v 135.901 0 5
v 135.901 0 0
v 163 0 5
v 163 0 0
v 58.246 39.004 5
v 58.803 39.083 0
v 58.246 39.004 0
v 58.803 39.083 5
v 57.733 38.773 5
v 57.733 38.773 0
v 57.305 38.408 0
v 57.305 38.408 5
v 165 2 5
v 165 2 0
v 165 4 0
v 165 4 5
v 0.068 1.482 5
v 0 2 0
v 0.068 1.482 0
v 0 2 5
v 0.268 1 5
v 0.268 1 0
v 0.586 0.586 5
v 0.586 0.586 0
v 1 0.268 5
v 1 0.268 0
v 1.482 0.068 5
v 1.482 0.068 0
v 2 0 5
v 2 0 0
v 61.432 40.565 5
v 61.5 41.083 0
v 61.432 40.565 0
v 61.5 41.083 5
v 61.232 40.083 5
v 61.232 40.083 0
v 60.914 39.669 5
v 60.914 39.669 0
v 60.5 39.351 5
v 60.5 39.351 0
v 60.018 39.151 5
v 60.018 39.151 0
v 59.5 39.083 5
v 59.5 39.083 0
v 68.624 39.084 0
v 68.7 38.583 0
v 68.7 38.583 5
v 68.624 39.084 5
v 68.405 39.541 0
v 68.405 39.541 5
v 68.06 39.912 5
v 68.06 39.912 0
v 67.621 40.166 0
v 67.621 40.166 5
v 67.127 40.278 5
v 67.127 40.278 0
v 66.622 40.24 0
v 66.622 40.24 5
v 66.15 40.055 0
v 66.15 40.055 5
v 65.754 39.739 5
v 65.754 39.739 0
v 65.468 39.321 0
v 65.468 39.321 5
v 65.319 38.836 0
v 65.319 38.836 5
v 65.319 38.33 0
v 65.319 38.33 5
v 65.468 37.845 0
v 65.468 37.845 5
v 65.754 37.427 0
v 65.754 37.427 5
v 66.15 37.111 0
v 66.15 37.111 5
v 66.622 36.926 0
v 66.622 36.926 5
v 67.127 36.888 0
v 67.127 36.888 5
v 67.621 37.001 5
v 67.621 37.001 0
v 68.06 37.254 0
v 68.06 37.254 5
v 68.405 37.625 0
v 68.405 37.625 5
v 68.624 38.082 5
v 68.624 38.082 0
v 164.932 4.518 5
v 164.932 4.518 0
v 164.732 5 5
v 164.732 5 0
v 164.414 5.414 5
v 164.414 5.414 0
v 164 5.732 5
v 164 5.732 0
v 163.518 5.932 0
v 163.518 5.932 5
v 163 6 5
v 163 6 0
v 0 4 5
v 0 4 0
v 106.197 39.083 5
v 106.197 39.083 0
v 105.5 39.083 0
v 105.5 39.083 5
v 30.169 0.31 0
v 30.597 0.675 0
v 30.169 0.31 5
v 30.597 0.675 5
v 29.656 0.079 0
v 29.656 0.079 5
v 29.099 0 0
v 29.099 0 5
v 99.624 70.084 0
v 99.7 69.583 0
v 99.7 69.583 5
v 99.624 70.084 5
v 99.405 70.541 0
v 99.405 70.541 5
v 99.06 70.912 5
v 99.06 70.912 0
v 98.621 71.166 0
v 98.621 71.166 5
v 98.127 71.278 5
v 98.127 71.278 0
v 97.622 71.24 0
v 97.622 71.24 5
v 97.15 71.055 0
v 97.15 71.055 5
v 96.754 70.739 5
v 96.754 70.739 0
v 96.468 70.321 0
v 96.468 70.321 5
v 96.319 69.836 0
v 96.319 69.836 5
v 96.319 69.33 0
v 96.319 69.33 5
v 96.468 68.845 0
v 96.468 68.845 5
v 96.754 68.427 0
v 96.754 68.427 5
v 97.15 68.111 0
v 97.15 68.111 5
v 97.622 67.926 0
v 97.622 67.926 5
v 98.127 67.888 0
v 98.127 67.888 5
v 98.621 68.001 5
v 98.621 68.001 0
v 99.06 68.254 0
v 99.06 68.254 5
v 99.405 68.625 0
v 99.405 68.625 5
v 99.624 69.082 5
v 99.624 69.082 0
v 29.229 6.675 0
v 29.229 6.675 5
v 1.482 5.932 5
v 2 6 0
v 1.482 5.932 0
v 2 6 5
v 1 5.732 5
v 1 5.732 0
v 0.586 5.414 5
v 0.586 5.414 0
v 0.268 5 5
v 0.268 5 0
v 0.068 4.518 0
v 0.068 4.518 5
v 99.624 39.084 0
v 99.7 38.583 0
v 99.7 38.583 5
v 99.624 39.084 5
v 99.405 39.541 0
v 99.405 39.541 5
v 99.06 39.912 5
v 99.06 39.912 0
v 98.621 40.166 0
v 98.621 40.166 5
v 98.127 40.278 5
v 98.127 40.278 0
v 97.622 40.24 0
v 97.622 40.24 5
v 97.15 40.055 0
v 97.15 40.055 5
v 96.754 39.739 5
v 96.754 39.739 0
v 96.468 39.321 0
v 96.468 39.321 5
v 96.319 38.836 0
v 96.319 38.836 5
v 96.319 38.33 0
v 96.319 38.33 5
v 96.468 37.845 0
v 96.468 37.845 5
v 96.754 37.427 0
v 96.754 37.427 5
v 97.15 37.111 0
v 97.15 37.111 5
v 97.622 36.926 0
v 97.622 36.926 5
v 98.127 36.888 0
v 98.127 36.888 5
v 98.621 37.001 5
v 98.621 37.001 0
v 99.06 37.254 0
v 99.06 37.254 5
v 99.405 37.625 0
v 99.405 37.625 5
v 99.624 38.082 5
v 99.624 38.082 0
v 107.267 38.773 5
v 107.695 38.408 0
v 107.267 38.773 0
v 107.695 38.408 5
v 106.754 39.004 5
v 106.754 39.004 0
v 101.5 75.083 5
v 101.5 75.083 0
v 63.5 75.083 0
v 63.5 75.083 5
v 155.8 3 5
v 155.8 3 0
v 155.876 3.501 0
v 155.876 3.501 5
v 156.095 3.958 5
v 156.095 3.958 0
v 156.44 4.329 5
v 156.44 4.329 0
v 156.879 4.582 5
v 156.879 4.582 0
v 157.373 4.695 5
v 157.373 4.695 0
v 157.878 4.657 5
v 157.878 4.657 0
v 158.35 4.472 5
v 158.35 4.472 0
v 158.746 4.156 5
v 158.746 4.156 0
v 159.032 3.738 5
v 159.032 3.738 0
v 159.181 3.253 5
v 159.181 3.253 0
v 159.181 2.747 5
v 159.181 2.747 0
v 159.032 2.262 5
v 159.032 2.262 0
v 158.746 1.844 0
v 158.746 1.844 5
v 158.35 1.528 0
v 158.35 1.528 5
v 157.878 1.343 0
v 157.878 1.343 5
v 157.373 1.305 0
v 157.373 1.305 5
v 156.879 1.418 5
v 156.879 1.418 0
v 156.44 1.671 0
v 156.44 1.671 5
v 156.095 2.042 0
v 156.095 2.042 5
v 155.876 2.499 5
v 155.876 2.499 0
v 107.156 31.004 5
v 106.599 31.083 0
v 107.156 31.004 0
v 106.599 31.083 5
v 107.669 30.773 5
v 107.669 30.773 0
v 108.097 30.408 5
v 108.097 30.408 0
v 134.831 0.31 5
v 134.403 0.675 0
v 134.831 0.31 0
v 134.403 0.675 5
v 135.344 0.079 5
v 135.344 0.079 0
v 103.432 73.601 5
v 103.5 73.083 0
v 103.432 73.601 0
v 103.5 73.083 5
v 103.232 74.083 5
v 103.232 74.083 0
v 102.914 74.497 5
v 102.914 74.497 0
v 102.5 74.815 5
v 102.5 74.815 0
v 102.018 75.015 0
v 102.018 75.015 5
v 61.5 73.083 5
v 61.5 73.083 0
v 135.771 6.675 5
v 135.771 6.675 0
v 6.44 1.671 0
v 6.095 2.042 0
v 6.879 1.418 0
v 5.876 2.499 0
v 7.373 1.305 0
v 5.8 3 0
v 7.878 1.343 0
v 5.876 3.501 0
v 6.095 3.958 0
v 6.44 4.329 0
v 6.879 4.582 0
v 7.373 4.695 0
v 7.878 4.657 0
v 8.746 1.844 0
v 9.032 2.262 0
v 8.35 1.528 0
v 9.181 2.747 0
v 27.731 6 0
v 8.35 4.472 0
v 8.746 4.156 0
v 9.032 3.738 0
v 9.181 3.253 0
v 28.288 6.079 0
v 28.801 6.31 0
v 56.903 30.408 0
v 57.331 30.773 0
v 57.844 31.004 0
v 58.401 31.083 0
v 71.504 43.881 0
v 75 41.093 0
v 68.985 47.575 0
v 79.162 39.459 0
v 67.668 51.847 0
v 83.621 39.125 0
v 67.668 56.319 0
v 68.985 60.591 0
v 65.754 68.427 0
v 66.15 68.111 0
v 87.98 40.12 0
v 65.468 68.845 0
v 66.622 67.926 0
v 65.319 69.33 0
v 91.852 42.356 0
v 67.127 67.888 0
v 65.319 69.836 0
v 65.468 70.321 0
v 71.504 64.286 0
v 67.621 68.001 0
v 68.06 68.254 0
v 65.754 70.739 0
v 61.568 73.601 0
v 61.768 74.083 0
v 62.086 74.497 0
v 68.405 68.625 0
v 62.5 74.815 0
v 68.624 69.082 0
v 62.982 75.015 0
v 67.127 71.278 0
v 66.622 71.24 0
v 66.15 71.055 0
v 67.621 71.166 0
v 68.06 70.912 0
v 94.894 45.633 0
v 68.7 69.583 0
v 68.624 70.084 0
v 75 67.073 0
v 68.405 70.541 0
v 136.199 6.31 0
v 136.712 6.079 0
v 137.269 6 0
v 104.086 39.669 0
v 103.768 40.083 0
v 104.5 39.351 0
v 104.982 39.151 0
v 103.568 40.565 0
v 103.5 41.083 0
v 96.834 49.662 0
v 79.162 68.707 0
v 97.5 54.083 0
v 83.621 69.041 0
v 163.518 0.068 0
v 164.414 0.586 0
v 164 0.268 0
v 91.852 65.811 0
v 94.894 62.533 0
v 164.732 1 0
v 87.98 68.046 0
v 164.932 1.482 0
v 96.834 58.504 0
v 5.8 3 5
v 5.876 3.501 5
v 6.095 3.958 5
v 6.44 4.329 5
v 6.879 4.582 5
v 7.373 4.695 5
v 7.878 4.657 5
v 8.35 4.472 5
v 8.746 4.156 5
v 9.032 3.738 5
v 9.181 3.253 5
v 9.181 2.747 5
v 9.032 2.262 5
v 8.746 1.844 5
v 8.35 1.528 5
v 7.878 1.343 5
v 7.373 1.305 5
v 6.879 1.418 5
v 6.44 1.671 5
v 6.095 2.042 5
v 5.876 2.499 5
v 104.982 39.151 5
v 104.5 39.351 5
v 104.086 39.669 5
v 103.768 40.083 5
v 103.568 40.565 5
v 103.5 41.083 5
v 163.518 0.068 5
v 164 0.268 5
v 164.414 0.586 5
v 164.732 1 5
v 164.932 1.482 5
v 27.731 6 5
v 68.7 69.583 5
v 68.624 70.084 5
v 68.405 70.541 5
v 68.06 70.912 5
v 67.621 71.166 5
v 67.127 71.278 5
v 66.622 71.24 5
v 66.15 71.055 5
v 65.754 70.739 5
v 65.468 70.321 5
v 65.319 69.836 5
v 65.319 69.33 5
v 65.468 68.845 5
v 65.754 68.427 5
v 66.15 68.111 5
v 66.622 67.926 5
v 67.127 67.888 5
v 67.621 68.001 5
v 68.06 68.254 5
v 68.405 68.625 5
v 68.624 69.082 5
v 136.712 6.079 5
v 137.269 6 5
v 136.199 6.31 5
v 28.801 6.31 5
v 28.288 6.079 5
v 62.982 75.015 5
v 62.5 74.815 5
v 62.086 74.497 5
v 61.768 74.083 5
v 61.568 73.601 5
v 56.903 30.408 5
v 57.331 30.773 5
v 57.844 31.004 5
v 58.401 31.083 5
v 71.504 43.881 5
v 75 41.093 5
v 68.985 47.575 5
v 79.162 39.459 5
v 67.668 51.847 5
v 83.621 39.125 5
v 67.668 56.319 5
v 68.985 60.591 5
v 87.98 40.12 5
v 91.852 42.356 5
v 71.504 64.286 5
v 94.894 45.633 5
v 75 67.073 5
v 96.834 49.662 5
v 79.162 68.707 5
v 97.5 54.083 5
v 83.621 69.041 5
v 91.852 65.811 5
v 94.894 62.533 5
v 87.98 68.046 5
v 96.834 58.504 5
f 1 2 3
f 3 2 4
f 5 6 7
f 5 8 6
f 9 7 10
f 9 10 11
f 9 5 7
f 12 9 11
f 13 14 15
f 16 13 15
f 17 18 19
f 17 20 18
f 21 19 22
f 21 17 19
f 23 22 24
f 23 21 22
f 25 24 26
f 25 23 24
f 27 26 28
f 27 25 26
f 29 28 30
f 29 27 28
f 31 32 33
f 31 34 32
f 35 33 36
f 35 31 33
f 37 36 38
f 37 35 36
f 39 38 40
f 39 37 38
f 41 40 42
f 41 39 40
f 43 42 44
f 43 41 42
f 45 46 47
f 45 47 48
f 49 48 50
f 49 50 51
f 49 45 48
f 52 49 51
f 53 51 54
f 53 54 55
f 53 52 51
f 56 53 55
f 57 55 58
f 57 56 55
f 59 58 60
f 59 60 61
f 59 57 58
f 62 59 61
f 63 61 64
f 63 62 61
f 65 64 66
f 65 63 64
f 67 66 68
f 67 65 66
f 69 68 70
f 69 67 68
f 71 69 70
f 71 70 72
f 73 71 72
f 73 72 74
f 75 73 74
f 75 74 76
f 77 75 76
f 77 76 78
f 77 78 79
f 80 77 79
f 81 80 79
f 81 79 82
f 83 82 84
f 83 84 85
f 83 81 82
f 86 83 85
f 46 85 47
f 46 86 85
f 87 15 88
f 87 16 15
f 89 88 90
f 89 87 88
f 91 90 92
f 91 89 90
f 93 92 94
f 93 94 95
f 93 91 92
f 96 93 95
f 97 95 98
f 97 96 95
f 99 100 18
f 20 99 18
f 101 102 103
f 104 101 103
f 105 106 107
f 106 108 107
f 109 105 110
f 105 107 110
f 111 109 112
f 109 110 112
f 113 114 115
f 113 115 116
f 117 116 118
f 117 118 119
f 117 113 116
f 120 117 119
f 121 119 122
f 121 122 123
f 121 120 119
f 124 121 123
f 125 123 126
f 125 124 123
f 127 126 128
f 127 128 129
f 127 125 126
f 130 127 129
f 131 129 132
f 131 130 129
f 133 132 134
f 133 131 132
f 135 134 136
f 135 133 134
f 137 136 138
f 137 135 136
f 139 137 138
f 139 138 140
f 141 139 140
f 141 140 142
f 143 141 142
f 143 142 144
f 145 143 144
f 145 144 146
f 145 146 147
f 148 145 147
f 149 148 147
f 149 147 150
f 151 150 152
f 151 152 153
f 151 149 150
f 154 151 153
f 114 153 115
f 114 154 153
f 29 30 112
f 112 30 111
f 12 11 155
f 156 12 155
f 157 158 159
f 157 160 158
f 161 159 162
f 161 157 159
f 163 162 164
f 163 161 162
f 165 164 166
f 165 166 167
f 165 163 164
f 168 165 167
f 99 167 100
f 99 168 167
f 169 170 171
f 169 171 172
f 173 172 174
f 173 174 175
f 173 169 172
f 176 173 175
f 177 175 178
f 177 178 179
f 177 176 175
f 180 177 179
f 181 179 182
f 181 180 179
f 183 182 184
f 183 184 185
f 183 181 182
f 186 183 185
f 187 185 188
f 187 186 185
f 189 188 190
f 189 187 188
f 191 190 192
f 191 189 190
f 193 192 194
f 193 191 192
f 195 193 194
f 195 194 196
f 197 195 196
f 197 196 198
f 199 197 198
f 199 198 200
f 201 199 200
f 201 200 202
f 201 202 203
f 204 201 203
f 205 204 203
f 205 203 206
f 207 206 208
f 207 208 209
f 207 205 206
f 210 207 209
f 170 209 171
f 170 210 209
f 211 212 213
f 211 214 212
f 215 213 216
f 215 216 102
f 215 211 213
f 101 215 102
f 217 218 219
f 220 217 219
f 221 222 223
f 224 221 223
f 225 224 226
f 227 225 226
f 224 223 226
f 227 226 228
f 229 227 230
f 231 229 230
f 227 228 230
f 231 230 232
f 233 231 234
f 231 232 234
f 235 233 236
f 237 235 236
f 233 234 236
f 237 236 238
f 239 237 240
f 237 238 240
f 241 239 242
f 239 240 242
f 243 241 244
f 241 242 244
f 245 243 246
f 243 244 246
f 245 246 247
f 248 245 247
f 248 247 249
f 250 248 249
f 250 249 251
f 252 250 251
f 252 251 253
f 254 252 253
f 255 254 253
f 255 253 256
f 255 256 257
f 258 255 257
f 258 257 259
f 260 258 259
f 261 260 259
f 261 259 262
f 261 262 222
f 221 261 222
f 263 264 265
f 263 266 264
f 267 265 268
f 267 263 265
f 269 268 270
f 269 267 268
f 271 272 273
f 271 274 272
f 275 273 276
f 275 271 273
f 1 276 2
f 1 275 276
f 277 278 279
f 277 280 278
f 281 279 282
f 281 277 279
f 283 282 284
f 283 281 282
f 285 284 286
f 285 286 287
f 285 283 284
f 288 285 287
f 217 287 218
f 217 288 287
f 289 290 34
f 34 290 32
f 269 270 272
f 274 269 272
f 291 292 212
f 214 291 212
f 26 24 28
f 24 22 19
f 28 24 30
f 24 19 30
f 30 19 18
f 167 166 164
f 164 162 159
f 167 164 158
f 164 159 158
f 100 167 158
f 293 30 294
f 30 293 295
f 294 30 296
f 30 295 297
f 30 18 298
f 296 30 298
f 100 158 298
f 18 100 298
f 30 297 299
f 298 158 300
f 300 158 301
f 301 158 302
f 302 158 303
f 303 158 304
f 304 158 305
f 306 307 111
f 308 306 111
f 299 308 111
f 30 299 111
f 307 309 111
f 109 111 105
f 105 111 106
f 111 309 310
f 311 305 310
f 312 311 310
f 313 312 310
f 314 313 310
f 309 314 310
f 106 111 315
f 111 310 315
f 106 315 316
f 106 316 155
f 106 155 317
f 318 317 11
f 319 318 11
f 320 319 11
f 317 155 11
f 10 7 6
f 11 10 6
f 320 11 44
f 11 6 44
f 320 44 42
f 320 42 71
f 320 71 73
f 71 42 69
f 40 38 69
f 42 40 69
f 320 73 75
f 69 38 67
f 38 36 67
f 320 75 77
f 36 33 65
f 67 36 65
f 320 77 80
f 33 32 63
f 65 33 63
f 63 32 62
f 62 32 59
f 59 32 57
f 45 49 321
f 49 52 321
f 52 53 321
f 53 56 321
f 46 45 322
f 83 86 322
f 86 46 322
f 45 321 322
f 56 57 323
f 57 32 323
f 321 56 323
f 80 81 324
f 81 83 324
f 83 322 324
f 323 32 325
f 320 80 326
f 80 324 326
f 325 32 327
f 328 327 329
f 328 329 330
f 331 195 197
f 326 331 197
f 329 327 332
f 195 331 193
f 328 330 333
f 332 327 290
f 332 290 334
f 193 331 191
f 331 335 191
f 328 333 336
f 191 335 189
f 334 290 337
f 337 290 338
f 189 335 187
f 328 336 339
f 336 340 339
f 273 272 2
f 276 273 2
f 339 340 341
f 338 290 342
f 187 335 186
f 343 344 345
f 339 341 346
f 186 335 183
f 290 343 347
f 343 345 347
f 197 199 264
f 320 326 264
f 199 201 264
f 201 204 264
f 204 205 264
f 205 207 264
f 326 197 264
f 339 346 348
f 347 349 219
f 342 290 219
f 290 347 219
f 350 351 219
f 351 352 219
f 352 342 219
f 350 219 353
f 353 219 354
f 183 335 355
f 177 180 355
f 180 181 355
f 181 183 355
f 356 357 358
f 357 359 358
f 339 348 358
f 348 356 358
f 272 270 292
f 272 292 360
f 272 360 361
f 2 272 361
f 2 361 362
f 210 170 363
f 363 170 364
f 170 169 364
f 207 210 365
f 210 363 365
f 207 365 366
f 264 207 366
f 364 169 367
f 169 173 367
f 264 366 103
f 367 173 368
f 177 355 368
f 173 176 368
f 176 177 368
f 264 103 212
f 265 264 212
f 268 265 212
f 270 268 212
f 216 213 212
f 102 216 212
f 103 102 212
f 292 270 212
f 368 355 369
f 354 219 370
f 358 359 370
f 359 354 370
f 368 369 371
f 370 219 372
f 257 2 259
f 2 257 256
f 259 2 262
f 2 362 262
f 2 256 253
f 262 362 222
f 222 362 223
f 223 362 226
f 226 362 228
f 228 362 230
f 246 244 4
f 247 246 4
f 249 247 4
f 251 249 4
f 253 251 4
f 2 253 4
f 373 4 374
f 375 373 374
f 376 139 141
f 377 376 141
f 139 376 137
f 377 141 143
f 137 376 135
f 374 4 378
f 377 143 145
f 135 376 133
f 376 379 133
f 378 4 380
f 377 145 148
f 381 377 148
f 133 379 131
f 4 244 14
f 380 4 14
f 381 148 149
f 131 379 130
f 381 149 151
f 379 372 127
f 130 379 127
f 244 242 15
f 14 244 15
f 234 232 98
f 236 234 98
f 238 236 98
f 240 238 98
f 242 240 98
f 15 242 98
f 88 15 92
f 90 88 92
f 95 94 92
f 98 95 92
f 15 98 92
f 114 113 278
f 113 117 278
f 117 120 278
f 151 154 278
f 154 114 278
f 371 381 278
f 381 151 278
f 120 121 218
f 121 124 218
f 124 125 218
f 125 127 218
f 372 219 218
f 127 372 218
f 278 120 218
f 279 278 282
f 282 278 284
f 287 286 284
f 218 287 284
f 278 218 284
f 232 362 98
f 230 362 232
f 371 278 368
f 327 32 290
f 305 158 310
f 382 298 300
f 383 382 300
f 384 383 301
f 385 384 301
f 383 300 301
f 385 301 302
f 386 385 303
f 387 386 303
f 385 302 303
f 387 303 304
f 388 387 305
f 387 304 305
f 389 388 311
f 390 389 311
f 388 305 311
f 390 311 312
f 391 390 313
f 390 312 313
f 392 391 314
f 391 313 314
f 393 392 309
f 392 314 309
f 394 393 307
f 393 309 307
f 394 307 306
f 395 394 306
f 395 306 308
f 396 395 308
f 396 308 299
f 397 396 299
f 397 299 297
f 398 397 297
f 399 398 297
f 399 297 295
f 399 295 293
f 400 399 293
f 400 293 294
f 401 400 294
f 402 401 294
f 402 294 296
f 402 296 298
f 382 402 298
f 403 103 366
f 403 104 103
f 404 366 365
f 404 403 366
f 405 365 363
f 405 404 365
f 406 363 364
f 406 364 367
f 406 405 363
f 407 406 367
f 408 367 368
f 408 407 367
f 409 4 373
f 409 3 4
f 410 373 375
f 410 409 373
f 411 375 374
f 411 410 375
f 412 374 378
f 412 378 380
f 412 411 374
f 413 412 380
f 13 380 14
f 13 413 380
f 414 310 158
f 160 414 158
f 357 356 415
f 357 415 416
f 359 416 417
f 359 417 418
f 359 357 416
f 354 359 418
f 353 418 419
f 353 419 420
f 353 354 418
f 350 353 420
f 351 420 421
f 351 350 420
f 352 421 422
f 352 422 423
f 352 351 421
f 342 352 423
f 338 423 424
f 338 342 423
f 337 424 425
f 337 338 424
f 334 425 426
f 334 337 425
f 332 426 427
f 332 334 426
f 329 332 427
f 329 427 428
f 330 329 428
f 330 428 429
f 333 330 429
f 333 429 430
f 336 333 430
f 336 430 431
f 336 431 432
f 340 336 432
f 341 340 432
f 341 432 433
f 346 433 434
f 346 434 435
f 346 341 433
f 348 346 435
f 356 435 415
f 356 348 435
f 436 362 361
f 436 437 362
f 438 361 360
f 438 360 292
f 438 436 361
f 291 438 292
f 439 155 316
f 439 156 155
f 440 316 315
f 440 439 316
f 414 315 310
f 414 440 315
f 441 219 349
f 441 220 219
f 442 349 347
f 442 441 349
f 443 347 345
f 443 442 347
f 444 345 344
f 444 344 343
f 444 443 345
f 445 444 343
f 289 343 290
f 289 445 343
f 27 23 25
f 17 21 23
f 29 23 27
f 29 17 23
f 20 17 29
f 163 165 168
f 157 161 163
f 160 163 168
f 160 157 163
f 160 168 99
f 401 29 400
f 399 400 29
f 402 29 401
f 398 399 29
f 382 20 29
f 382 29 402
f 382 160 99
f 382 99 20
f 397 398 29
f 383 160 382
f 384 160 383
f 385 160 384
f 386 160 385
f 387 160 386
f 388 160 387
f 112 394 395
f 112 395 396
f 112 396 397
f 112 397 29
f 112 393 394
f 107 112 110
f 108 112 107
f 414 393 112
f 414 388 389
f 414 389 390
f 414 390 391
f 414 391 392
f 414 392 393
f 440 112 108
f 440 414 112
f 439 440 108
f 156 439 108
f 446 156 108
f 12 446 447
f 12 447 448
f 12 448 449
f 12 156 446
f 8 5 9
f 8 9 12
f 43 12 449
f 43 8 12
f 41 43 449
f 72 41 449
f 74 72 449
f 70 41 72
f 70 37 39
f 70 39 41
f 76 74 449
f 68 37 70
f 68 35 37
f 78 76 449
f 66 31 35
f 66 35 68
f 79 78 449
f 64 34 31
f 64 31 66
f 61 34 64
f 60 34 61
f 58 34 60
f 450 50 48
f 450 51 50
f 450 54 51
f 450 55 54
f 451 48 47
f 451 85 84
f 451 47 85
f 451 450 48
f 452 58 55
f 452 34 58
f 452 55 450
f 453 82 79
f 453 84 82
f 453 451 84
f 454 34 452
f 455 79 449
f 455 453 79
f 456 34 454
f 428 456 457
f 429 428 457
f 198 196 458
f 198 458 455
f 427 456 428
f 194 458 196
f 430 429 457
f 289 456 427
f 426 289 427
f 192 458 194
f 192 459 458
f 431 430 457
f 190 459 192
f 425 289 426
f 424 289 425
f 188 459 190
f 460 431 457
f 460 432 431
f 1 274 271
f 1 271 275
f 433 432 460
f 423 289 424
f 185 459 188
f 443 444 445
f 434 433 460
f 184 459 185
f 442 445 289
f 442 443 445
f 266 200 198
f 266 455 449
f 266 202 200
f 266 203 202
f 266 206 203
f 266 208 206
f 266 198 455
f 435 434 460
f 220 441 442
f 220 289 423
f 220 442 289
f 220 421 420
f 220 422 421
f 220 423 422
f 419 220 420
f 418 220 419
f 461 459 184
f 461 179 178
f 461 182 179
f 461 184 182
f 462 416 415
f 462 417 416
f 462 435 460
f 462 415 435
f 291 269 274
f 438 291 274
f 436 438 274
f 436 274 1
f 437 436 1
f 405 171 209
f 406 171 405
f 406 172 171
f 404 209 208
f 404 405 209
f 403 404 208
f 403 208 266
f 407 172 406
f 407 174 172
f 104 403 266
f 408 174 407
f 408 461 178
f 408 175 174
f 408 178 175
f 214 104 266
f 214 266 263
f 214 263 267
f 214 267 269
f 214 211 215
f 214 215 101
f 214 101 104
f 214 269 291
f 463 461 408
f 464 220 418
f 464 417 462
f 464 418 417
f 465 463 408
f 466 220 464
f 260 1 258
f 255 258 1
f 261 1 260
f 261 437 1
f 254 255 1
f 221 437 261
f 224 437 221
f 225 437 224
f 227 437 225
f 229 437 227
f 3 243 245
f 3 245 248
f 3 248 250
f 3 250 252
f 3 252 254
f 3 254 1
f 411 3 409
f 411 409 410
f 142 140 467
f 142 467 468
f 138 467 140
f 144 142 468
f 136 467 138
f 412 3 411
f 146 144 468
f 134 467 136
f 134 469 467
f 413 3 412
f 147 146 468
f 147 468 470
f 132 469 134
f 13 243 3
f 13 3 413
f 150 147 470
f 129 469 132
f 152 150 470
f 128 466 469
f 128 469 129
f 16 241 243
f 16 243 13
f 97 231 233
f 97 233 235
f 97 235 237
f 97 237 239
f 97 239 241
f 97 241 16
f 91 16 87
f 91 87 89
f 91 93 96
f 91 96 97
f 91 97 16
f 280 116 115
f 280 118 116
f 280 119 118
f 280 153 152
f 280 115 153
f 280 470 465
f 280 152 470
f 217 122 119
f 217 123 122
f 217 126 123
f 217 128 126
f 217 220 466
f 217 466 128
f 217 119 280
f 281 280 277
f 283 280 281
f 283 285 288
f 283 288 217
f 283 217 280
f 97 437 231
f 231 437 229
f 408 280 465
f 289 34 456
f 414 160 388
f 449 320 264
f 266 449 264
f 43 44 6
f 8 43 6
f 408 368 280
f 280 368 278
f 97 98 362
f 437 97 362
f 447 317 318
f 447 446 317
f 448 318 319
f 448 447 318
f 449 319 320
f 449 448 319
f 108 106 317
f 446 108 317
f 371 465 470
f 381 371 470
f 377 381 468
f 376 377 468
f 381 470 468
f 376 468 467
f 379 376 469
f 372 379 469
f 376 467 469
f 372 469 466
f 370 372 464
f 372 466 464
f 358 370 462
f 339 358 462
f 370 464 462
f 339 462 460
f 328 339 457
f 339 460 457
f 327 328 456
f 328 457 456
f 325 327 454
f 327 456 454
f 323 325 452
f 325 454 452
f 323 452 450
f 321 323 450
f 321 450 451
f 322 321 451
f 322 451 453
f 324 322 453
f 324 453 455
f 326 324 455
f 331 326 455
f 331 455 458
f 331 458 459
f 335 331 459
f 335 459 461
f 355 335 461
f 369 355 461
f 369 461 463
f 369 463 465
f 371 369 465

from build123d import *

# Parameters (mm, degrees)
EXTRUDE_1_DEPTH            = 5
FILLET_1_R                 = 2
HOLE_WIZARD_M3_1_OUTLINE_R = 1.7
HOLE_WIZARD_M3_1_DEPTH     = 5
SKETCH_4_R                 = 15
CUT_EXTRUDE_1_DEPTH        = 10
HOLE_WIZARD_M3_5_D         = 3.4


# Read off the part's stored shape, not the designer's step: M3 间隙孔1
with BuildPart() as part:
    # 草图1 → 凸台-拉伸1 (new body)
    with BuildSketch(Plane.XY):
        Polygon((30, 0), (57.5, 31.083095625), (107.5, 31.083095625), (135, 0), (165, 0), (165, 6), (136.367610504, 6), (107.098159975, 39.083095625), (103.5, 39.083095625), (103.5, 75.083095625), (61.5, 75.083095625), (61.5, 39.083095625), (57.901840025, 39.083095625), (28.632389496, 6), (0, 6), (0, 0), align=None)
    extrude(amount=EXTRUDE_1_DEPTH)

    # 圆角1
    fillet_1_edges = [part.edges().sort_by_distance(p)[0] for p in [
        (28.632389496, 6, 2.5),
        (0, 6, 2.5),
        (0, 0, 2.5),
        (30, 0, 2.5),
        (57.5, 31.083095625, 2.5),
        (107.5, 31.083095625, 2.5),
        (135, 0, 2.5),
        (165, 0, 2.5),
        (165, 6, 2.5),
        (136.367610504, 6, 2.5),
        (107.098159975, 39.083095625, 2.5),
        (103.5, 39.083095625, 2.5),
        (103.5, 75.083095625, 2.5),
        (61.5, 75.083095625, 2.5),
        (61.5, 39.083095625, 2.5),
        (57.901840025, 39.083095625, 2.5),
    ]]
    fillet(fillet_1_edges, radius=FILLET_1_R)

    # M3 间隙孔1 outline → M3 间隙孔1 (cut)
    with BuildSketch(Plane.XY):
        with Locations((98, 69.583095625)):
            Circle(HOLE_WIZARD_M3_1_OUTLINE_R)
        with Locations((67, 38.583095625)):
            Circle(HOLE_WIZARD_M3_1_OUTLINE_R)
        with Locations((98, 38.583095625)):
            Circle(HOLE_WIZARD_M3_1_OUTLINE_R)
        with Locations((67, 69.583095625)):
            Circle(HOLE_WIZARD_M3_1_OUTLINE_R)
    extrude(amount=HOLE_WIZARD_M3_1_DEPTH, mode=Mode.SUBTRACT)

    # 草图4 → 切除-拉伸1 (cut)
    with BuildSketch(Plane.XY.offset(5)):
        with Locations((82.5, 54.083095625)):
            Circle(SKETCH_4_R)
    extrude(amount=-CUT_EXTRUDE_1_DEPTH, mode=Mode.SUBTRACT)

    # M3 间隙孔5 (through all)
    with Locations(Plane.XY.offset(5)):
        with Locations((7.5, 3), (157.5, 3)):
            Hole(HOLE_WIZARD_M3_5_D / 2)


solid = part.part
